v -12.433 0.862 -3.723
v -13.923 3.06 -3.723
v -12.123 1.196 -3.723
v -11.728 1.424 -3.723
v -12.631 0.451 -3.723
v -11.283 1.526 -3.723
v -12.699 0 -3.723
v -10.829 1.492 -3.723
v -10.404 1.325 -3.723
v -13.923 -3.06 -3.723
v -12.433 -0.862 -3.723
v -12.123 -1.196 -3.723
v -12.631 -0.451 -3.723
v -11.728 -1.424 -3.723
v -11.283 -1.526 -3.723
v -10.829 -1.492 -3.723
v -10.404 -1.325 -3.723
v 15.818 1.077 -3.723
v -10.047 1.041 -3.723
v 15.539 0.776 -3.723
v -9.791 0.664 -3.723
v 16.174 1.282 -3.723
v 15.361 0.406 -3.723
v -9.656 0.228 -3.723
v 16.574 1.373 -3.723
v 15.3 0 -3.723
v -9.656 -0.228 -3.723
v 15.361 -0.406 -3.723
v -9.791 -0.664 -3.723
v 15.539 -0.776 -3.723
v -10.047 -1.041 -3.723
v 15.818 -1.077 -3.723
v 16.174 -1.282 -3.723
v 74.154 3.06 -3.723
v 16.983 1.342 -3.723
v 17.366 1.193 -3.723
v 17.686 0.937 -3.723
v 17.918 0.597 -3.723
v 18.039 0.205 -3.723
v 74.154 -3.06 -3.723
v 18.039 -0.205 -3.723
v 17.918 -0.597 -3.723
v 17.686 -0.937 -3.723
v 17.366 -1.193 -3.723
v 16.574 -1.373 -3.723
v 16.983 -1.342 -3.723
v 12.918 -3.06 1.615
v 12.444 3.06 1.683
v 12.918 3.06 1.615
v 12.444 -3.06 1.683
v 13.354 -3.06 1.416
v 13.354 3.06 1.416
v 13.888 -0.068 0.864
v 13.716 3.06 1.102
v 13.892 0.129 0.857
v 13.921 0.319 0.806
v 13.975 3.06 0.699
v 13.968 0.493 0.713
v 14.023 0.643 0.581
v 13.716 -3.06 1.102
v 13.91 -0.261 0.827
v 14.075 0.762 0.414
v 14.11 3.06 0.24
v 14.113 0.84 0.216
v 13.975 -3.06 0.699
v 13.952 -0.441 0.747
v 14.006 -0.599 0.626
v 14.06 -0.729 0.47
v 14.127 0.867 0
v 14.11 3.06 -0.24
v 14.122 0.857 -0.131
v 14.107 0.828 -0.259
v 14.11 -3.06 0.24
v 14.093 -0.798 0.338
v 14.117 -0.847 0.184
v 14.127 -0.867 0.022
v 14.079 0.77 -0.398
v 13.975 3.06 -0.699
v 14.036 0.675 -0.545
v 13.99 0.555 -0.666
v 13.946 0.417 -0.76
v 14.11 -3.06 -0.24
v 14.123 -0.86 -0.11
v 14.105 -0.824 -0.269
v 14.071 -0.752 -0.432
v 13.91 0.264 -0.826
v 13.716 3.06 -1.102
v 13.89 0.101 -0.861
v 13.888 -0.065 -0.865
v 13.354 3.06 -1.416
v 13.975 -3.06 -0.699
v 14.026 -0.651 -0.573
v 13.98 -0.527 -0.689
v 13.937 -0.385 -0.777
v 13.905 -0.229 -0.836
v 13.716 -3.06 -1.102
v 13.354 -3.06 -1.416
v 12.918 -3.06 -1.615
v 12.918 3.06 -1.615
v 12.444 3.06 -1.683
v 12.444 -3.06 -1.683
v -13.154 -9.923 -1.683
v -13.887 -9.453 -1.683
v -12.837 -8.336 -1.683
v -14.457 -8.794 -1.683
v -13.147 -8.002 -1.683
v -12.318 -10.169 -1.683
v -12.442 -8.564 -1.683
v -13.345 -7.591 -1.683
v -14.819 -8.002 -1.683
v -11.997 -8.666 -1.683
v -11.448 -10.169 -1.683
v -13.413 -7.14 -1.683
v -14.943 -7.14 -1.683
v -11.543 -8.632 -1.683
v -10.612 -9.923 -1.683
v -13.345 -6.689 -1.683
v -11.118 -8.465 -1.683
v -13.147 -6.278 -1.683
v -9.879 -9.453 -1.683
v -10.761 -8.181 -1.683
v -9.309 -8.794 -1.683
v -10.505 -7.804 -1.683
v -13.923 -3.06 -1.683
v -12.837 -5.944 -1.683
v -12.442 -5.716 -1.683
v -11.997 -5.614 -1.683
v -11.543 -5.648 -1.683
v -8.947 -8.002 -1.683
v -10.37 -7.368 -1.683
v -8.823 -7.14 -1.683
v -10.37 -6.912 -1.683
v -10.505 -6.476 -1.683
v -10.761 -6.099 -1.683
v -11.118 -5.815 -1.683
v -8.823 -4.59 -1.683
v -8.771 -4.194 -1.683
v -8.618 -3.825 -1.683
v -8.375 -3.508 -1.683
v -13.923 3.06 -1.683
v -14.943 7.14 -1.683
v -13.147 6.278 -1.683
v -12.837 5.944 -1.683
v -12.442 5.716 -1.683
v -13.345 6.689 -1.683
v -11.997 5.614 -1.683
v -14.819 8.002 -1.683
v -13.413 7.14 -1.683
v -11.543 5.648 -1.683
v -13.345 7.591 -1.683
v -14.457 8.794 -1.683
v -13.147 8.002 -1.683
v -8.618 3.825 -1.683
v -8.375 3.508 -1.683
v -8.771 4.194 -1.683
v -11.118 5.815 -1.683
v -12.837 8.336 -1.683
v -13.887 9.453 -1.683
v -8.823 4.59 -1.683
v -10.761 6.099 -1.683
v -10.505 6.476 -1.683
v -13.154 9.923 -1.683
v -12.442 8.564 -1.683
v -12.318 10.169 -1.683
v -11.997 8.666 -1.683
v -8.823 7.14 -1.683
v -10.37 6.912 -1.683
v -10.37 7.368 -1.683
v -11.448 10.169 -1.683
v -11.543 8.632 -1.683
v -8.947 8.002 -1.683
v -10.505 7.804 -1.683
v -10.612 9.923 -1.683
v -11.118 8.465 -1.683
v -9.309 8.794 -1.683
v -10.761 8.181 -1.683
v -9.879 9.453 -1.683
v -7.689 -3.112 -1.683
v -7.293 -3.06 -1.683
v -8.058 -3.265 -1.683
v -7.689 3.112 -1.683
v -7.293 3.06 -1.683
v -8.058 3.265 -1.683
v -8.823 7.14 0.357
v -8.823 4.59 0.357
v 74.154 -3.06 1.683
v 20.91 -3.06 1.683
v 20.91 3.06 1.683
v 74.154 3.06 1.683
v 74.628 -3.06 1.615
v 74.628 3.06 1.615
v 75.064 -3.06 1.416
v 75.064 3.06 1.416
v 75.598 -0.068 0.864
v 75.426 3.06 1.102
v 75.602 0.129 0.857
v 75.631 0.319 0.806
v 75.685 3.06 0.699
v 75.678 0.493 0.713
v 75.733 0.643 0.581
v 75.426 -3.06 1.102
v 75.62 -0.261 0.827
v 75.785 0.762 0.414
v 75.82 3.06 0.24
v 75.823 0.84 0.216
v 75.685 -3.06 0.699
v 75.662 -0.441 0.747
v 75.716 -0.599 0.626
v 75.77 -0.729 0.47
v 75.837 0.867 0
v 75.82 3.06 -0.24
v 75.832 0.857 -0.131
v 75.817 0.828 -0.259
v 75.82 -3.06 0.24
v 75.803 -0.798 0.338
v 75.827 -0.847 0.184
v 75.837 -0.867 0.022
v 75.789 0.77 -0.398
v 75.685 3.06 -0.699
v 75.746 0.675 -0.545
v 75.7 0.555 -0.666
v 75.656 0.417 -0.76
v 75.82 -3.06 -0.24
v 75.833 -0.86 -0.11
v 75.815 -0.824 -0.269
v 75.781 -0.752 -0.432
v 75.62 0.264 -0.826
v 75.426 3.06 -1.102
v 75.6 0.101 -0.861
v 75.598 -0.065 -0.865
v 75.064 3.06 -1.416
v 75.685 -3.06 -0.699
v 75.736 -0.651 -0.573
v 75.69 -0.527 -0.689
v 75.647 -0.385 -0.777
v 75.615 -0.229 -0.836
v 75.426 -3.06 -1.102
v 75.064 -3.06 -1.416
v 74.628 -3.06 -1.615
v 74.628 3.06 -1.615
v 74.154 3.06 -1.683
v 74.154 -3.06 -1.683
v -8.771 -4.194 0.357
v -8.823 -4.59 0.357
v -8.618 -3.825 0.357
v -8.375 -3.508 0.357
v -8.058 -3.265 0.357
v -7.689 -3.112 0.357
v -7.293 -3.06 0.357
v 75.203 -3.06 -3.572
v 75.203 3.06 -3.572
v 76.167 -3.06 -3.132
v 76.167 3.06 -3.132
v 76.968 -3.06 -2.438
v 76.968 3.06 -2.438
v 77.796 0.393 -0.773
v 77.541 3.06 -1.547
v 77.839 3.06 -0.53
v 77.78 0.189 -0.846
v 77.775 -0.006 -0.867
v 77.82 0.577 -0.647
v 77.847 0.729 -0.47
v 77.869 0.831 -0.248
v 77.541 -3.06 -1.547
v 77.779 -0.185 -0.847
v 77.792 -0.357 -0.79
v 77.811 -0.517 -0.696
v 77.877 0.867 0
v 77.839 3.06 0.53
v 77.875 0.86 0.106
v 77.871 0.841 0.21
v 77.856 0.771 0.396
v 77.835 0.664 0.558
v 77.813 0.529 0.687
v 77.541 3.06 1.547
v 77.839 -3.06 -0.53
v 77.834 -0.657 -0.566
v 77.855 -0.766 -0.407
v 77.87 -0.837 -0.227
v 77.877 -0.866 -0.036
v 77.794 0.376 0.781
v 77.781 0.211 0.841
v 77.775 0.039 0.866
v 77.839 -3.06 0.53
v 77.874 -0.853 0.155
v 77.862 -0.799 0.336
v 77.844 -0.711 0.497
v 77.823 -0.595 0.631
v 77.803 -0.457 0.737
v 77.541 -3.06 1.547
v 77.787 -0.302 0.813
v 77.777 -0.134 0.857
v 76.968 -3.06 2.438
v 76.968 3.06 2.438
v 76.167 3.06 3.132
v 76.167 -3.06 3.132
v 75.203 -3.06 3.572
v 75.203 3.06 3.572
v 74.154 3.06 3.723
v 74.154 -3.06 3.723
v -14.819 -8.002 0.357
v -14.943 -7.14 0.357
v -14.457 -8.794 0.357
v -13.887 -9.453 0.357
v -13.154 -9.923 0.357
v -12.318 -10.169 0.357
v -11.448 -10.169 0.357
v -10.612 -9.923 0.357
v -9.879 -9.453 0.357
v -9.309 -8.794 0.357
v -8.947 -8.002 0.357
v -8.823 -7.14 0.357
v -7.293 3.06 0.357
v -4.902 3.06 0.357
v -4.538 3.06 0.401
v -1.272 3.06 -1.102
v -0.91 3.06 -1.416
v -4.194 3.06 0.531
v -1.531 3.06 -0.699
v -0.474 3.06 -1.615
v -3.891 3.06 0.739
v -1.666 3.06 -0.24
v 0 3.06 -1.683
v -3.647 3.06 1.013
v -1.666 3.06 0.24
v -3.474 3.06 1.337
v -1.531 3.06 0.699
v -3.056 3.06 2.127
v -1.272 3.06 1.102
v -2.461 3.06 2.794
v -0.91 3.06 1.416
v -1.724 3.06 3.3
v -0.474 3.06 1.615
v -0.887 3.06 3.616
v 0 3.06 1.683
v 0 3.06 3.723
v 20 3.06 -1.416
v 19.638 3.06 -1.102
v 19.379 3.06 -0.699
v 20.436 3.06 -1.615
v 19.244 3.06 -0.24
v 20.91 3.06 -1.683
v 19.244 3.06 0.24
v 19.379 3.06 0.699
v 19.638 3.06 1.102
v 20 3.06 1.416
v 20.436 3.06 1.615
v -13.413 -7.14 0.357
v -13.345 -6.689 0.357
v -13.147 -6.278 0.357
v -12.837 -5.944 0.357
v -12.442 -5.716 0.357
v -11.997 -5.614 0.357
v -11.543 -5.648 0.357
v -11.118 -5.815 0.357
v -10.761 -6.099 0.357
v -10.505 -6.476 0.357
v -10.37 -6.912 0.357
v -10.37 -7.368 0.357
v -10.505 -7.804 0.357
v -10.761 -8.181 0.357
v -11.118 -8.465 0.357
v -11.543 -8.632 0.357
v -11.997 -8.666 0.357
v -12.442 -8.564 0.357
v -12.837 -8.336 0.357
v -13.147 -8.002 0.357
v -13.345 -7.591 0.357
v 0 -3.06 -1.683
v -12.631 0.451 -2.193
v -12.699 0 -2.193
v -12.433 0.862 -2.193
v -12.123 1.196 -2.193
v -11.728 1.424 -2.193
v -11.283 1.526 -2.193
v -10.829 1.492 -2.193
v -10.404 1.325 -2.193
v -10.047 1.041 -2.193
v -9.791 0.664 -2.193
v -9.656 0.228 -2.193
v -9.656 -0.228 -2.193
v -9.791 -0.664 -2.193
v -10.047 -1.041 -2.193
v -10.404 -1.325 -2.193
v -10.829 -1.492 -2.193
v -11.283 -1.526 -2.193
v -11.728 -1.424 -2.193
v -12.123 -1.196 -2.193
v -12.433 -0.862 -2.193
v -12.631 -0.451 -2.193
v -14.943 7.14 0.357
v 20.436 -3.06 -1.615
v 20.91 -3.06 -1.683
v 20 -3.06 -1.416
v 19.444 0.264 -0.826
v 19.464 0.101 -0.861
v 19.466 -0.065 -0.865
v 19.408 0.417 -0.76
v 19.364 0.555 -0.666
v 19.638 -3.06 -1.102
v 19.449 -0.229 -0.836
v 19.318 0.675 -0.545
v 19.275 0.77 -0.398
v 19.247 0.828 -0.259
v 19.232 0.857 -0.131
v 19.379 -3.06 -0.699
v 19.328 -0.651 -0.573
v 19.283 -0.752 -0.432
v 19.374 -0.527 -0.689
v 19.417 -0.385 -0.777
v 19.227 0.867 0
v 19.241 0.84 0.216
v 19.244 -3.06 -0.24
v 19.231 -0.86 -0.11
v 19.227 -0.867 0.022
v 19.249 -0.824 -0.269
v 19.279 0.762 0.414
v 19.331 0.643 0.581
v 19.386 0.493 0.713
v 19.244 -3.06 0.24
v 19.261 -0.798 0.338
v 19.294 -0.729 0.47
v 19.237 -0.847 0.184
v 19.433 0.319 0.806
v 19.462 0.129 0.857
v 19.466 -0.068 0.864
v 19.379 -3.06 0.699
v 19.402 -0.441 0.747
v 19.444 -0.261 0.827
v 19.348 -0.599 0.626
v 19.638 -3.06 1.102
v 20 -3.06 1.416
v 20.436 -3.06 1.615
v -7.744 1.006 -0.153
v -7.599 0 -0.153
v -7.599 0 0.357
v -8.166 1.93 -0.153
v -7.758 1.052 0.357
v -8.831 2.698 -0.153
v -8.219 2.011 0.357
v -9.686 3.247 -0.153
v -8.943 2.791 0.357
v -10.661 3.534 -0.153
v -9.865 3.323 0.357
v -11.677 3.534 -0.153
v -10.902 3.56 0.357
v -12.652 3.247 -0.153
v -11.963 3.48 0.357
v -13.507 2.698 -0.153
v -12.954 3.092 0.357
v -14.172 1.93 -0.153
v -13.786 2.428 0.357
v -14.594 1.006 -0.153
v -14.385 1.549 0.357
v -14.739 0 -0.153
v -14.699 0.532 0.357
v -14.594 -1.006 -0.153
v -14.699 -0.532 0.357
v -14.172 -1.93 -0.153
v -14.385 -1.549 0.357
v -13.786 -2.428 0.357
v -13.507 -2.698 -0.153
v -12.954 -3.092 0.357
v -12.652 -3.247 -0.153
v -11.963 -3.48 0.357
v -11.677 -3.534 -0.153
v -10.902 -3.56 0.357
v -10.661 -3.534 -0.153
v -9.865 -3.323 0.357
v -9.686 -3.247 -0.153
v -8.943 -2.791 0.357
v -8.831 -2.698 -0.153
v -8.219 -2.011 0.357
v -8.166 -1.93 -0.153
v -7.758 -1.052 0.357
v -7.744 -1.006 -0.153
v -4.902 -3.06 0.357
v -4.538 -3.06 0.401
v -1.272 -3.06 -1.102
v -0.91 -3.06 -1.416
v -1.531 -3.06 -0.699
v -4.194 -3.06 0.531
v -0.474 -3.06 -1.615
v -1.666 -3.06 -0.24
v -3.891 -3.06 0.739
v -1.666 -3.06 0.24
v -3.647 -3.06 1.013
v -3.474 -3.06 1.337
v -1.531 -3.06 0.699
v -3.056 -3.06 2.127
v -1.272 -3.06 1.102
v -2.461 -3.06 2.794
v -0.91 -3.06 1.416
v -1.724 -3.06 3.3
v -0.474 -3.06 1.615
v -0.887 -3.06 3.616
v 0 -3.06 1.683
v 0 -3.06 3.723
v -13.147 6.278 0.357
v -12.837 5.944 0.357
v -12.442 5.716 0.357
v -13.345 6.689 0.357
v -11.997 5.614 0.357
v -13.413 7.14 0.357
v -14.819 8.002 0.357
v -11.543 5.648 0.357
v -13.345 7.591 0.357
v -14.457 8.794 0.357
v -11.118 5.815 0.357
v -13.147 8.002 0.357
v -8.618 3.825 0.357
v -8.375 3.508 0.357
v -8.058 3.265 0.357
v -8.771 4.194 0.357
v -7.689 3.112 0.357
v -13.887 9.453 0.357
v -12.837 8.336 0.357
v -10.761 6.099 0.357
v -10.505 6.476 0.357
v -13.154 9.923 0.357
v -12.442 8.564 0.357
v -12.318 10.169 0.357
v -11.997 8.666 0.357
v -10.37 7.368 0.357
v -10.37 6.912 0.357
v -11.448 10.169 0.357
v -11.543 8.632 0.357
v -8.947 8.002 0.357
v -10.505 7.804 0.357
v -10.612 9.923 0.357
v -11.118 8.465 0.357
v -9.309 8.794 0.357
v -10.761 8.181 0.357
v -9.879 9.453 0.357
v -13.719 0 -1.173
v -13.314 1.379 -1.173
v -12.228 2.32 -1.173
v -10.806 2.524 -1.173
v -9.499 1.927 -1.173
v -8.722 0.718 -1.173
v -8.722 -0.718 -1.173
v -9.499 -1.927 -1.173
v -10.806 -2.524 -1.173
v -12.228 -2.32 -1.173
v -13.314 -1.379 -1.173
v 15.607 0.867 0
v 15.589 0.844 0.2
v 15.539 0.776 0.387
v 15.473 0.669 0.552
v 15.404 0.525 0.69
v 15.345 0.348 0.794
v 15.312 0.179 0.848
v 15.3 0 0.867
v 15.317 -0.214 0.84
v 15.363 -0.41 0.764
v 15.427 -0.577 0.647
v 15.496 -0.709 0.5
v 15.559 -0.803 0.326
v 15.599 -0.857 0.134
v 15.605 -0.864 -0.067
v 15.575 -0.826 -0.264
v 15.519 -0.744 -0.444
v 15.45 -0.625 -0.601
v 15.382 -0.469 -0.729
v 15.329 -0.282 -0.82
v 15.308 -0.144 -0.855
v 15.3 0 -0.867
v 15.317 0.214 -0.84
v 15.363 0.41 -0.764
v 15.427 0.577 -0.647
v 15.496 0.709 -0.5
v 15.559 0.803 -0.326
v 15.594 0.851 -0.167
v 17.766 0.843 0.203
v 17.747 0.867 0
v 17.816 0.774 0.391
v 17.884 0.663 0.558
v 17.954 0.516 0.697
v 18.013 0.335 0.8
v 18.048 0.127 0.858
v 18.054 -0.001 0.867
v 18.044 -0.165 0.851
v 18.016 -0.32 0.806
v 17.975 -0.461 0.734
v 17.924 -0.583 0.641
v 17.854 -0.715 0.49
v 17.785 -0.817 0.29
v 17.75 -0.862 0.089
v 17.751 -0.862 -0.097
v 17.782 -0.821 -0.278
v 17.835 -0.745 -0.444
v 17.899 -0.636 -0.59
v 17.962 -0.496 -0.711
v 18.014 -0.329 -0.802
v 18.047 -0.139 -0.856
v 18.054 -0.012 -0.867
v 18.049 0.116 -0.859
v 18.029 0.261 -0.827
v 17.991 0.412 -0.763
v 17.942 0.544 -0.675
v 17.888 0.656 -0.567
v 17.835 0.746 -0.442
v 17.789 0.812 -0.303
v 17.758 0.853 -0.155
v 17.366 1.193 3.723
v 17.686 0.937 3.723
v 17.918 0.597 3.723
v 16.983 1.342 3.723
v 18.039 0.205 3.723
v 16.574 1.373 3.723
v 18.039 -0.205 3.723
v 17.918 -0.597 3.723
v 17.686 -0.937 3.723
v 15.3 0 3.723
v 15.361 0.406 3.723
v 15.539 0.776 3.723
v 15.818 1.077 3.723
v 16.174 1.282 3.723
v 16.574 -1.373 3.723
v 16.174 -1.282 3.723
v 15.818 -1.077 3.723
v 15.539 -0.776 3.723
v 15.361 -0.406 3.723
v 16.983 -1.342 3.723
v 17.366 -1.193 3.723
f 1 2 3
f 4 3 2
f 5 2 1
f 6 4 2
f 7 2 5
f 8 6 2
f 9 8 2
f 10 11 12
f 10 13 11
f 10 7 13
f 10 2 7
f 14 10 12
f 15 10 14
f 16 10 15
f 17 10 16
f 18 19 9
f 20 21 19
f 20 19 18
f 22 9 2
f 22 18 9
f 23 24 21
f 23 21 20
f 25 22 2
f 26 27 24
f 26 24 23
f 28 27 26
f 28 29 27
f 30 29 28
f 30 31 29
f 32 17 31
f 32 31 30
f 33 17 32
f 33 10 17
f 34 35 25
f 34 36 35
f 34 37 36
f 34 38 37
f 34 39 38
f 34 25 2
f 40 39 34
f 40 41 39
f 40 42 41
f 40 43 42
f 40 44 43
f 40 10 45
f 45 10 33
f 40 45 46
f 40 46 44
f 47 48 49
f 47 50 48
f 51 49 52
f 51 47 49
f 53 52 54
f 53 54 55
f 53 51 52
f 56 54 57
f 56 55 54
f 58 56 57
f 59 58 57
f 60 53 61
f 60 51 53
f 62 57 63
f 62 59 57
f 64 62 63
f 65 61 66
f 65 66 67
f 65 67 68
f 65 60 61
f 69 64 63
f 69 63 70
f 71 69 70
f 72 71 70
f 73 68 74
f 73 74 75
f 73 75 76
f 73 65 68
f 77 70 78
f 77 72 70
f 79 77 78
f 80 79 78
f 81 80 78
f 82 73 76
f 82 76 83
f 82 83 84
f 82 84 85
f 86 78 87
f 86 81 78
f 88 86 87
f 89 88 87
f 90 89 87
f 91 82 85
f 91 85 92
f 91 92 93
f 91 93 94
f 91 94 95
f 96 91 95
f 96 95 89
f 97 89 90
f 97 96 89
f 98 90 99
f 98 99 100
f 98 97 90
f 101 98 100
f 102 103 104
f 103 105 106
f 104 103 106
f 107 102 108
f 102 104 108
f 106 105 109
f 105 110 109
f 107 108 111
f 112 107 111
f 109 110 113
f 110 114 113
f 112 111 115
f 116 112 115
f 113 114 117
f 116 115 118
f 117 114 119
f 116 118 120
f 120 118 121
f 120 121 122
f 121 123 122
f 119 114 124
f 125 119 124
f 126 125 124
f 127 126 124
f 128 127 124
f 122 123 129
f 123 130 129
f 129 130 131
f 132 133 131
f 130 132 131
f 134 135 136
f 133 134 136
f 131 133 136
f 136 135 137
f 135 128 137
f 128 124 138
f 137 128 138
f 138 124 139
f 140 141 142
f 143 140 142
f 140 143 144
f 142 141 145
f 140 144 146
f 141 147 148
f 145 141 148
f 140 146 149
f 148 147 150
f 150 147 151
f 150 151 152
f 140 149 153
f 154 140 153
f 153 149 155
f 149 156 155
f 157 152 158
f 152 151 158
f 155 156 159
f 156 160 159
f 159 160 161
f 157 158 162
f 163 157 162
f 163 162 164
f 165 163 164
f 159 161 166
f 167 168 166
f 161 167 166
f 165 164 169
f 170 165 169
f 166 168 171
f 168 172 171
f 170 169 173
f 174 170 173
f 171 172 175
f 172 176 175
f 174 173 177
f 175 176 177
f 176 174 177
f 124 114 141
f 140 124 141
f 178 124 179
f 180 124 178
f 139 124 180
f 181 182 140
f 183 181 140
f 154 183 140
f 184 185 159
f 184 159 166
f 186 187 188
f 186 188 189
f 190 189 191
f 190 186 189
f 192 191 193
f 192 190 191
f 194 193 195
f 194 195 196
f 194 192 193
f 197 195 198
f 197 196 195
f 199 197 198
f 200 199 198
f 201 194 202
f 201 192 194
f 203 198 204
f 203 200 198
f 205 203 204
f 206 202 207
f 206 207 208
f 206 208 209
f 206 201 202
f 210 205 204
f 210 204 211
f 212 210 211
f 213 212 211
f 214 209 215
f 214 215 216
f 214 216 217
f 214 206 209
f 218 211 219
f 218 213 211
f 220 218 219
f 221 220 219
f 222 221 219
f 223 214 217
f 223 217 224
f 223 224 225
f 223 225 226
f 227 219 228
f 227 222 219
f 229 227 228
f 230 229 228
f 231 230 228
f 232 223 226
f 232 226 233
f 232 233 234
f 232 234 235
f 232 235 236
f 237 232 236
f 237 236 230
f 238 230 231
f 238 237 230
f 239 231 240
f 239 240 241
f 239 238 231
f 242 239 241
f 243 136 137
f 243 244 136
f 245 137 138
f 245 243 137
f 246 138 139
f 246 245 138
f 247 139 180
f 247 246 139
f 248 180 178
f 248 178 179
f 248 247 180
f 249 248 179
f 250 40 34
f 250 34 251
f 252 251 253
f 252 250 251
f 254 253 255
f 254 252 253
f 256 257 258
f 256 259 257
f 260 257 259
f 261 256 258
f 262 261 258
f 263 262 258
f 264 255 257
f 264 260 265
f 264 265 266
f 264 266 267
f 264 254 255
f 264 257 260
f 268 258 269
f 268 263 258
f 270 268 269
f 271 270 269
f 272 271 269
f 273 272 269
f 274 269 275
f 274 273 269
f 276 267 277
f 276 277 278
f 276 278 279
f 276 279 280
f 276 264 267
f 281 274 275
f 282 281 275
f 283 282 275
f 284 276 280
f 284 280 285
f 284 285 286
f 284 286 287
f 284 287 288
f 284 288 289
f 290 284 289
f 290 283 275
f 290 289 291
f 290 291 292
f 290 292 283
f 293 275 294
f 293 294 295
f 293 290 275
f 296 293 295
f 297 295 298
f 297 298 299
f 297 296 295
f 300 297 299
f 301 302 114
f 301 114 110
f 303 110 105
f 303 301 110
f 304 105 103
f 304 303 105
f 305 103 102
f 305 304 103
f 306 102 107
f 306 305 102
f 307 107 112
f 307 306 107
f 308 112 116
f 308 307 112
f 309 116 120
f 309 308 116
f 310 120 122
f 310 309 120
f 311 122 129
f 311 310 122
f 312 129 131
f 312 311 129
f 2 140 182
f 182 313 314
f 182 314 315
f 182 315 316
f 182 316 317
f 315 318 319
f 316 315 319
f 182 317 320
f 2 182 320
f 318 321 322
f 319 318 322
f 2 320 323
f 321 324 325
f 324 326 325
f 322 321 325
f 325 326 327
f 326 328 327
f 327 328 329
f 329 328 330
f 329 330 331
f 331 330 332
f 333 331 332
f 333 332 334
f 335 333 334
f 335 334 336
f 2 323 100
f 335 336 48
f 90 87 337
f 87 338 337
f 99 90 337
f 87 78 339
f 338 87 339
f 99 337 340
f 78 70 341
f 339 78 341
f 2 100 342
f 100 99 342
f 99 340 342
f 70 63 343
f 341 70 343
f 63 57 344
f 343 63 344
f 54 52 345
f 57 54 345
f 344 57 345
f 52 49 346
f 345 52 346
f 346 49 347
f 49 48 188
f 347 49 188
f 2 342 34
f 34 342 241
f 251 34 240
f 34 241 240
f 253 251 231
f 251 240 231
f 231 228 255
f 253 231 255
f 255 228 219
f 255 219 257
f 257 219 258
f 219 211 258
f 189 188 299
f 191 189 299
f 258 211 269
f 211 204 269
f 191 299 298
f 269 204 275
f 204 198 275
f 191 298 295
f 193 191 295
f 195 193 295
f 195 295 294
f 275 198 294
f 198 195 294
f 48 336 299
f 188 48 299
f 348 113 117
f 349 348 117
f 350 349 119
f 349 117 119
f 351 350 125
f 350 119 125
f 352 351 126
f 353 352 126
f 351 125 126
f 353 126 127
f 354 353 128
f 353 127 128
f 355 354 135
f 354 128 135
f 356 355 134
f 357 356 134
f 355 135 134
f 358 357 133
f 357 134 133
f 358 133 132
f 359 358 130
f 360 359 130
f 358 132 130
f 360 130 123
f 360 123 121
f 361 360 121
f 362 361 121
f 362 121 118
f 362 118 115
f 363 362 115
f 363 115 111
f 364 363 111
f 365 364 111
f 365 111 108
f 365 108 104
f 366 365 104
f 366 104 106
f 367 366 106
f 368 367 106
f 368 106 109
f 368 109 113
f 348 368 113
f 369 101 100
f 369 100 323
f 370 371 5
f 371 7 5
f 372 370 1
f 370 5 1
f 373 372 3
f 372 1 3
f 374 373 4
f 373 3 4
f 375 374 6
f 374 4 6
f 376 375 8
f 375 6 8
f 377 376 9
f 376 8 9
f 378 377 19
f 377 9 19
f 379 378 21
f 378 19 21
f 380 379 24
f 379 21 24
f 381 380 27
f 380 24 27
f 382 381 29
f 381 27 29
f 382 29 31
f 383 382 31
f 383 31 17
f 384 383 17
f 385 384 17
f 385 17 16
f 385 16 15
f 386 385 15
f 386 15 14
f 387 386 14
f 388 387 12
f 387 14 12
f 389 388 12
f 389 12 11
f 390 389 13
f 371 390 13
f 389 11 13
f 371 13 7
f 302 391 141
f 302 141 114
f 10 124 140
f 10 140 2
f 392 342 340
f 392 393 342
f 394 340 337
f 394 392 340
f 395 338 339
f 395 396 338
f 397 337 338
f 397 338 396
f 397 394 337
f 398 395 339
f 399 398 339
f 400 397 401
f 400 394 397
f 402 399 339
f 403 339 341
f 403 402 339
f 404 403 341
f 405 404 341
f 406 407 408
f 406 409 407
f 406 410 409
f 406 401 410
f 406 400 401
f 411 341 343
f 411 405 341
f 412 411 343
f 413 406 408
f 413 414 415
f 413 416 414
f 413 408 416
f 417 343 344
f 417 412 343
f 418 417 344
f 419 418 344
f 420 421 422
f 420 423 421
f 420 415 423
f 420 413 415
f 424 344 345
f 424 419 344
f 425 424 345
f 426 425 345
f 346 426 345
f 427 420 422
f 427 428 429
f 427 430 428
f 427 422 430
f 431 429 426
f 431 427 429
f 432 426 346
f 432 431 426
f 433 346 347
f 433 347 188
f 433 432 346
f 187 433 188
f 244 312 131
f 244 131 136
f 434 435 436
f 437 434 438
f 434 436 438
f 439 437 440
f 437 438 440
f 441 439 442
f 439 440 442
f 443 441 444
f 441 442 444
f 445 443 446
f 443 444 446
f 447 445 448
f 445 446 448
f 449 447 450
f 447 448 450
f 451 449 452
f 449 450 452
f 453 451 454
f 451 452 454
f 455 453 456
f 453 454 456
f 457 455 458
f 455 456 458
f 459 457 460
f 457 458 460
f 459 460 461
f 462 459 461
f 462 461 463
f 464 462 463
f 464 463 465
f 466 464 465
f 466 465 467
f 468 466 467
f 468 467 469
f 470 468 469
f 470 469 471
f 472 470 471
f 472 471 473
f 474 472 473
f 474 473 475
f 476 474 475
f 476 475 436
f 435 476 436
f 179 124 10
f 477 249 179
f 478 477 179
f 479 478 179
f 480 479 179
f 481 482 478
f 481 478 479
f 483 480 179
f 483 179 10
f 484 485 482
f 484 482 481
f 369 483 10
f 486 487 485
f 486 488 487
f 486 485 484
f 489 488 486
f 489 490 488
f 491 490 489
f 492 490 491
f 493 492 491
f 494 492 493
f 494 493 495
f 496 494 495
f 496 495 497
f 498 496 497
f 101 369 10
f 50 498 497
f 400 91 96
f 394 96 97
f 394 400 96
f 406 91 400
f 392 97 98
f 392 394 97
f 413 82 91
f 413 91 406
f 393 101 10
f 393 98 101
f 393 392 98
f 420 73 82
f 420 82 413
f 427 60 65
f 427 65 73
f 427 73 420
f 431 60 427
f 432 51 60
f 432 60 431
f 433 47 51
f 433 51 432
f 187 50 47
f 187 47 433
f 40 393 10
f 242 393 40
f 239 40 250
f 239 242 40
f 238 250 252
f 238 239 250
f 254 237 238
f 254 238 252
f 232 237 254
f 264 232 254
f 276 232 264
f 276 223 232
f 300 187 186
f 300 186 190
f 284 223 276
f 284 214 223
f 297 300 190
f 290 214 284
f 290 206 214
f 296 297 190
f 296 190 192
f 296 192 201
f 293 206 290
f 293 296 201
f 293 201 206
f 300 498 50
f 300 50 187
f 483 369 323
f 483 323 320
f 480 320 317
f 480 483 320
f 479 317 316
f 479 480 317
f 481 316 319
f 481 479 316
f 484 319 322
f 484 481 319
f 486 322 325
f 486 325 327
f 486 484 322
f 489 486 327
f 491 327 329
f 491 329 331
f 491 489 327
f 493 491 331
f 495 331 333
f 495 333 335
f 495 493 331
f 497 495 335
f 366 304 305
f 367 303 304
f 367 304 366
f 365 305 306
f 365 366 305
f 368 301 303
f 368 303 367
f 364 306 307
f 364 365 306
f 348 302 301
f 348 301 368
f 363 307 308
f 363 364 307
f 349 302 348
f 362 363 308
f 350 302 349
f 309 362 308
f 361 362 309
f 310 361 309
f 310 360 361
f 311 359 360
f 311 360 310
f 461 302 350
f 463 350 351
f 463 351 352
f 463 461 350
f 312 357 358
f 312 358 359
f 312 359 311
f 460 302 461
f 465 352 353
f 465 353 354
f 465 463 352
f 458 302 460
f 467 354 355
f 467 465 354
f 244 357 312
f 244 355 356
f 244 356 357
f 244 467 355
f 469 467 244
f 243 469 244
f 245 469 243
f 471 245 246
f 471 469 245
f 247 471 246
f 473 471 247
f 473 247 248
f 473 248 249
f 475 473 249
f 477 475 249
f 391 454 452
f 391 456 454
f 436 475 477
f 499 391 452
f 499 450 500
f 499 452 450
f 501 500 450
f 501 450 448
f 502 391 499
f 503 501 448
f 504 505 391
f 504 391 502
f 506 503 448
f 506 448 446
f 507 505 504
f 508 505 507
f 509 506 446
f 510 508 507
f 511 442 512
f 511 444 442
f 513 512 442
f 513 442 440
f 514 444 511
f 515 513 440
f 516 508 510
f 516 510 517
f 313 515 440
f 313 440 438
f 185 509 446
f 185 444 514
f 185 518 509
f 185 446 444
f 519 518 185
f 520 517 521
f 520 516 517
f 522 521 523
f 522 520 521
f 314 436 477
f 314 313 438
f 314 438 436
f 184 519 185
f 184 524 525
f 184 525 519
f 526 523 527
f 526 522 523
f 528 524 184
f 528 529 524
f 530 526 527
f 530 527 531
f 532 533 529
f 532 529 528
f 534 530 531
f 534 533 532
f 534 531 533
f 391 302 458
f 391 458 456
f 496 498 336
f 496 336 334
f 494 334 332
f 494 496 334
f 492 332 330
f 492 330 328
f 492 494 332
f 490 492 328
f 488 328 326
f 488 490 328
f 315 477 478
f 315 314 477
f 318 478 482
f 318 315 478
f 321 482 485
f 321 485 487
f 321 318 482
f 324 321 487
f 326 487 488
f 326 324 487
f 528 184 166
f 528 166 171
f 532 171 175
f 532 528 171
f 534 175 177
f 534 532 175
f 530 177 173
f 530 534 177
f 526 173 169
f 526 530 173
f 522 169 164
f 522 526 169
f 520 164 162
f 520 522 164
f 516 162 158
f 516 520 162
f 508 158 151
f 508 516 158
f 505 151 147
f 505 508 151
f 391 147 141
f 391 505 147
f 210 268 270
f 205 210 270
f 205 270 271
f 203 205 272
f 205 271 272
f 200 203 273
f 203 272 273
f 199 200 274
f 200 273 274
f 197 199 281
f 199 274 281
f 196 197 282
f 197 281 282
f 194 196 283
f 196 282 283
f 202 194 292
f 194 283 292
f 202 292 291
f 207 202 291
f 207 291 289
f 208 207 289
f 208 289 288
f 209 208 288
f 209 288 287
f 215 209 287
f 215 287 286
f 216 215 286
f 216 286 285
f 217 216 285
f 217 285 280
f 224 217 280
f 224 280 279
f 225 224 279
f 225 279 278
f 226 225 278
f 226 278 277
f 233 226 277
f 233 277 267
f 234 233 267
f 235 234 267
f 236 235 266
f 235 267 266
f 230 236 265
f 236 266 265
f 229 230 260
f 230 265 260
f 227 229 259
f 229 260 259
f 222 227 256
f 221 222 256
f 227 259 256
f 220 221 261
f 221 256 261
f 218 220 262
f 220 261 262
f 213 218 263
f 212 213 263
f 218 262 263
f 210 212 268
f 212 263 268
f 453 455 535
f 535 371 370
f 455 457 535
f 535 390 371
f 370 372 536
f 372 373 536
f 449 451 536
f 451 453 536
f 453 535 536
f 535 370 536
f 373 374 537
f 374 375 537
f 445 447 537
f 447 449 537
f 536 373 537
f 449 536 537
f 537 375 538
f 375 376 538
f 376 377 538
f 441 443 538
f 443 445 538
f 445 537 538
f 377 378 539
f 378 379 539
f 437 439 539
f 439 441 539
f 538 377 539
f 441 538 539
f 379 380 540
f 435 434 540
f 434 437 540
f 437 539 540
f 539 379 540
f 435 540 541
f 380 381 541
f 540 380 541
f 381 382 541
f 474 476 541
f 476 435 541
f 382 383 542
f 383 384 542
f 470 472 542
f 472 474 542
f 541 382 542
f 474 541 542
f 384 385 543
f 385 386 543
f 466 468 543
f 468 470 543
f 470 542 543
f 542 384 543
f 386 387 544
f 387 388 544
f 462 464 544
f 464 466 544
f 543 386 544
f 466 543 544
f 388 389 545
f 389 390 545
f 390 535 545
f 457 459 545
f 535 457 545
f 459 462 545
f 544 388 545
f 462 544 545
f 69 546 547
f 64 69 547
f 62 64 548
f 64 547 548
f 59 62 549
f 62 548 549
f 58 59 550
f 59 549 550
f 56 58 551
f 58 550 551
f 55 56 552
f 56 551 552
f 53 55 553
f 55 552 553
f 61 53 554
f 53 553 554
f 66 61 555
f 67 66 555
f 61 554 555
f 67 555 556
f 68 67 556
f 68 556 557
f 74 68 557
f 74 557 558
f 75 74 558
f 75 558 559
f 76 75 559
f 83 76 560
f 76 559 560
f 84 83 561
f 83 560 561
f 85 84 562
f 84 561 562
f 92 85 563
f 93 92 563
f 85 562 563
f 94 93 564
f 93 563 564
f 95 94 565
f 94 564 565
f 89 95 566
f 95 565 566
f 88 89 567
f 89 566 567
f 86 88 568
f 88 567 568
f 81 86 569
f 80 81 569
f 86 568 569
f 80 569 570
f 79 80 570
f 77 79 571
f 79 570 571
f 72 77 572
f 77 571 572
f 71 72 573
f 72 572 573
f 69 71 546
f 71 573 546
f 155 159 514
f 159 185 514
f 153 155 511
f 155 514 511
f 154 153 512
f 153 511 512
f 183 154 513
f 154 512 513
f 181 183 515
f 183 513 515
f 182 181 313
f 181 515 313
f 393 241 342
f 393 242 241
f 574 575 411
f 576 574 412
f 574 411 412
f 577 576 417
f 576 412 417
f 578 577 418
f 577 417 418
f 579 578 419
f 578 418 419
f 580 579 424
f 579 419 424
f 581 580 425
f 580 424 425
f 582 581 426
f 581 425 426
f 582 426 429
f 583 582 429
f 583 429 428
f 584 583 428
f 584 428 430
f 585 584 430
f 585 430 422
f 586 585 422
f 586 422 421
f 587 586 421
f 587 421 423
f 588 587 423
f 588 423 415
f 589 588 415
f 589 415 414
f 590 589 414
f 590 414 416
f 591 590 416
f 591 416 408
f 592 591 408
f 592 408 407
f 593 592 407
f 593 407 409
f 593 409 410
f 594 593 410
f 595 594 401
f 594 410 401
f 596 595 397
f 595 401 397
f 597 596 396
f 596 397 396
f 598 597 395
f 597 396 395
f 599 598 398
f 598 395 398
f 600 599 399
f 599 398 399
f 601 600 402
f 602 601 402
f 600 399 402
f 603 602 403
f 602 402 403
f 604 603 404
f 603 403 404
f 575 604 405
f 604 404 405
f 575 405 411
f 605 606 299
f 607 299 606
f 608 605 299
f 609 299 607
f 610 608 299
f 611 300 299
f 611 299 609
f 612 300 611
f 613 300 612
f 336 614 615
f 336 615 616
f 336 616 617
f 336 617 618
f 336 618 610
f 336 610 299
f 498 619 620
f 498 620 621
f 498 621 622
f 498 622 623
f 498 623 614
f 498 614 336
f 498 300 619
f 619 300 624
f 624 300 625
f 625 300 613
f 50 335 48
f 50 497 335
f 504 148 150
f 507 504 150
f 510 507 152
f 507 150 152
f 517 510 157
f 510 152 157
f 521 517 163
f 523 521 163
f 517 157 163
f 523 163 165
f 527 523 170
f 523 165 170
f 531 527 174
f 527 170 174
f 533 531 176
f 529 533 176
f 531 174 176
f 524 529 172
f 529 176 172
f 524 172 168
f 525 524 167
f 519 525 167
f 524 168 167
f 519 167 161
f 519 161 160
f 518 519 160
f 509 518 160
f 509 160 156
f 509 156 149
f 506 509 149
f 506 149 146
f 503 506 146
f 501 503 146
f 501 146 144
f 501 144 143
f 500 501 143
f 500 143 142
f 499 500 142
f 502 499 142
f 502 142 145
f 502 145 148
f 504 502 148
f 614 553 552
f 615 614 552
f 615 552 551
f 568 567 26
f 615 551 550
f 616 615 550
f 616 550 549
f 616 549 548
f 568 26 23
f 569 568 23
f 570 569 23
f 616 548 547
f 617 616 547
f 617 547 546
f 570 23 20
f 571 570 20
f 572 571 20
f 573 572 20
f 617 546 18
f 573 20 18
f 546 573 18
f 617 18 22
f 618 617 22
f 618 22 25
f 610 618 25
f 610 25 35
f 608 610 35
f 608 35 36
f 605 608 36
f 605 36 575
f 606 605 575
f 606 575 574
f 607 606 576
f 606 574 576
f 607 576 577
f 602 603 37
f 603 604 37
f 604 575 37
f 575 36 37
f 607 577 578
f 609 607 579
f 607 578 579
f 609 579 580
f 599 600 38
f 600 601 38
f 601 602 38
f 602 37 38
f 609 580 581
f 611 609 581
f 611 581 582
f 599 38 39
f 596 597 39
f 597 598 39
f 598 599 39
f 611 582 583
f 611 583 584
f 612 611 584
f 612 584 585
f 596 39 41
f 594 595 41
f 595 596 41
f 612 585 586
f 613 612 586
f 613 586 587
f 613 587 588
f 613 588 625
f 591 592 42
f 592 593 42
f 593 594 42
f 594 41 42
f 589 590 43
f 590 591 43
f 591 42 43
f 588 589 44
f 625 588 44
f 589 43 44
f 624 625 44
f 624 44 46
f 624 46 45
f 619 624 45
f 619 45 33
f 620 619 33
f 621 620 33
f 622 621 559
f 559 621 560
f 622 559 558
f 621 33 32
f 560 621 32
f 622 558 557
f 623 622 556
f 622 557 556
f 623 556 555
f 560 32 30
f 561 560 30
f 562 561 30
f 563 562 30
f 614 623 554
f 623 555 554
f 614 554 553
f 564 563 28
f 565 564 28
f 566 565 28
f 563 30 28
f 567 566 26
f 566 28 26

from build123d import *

# Parameters (mm, degrees)
F1_DEPTH       = 3
F3_DEPTH       = 6
F5_DEPTH       = 2
F6_R           = 3.5
F7_DEPTH       = 0.5
F9_D           = 3
F9_CSINK_D     = 7
F9_CSINK_ANGLE = 90
F10_D          = 3
F11_R          = 1.5
F14_R          = 0.85
F15_DEPTH      = 63.7357865376
F17_D          = 2.7
F18_SCALE      = 1.02


with BuildPart() as f1:
    # F0 (on Front) → F1 (new body, symmetric)
    with BuildSketch(Plane.XZ):
        with BuildLine():
            ThreePointArc((0, 3.65), (-3.65, 0), (0, -3.65))
            Line((0, -3.65), (72.7, -3.65))
            ThreePointArc((72.7, -3.65), (76.35, 0), (72.7, 3.65))
            Line((72.7, 3.65), (0, 3.65))
        make_face()
        with BuildLine():
            Line((12.2, -1.65), (0, -1.65))
            ThreePointArc((0, -1.65), (-1.65, 0), (0, 1.65))
            Line((0, 1.65), (12.2, 1.65))
            ThreePointArc((12.2, 1.65), (13.85, 0), (12.2, -1.65))
        make_face(mode=Mode.SUBTRACT)
        with BuildLine():
            Line((20.5, 1.65), (72.7, 1.65))
            ThreePointArc((72.7, 1.65), (74.35, 0), (72.7, -1.65))
            Line((72.7, -1.65), (20.5, -1.65))
            ThreePointArc((20.5, -1.65), (18.85, 0), (20.5, 1.65))
        make_face(mode=Mode.SUBTRACT)
    extrude(amount=F1_DEPTH, both=True)

    # F2 (on face) → F3 (join, through all)
    with BuildSketch(Plane.XZ.offset(3)):
        with BuildLine():
            Line((-13.65, -3.65), (0, -3.65))
            ThreePointArc((0, -3.65), (-2.7018512172, -2.4540782384), (-3.6331804249, 0.35))
            Line((-3.6331804249, 0.35), (-13.65, 0.35))
            Line((-13.65, 0.35), (-13.65, -3.65))
        make_face()
    extrude(amount=-F3_DEPTH)

    # F4 (on face) → F5 (join)
    with BuildSketch(Plane.XY.offset(0.35)):
        with BuildLine():
            ThreePointArc((-14.65, -7), (-11.65, -10), (-8.65, -7))
            Line((-8.65, -7), (-8.65, 7))
            ThreePointArc((-8.65, 7), (-11.65, 10), (-14.65, 7))
            Line((-14.65, 7), (-14.65, -7))
        make_face()
    extrude(amount=-F5_DEPTH)

    # F6 (on face) → F7 (cut)
    with BuildSketch(Plane.XY.offset(0.35)):
        with Locations((-10.95, 0)):
            Circle(F6_R)
    extrude(amount=-F7_DEPTH, mode=Mode.SUBTRACT)

    # F9 (through all)
    with Locations(Plane.XY.offset(-0.15)):
        with Locations((-10.95, 0)):
            CounterSinkHole(F9_D / 2, F9_CSINK_D / 2, counter_sink_angle=F9_CSINK_ANGLE)

    # F10 (through all)
    with Locations(Plane.XY.offset(0.35)):
        with Locations((-11.65, 7), (-11.65, -7)):
            Hole(F10_D / 2)

    # F11
    f11_edges = [f1.edges().sort_by_distance(p)[0] for p in [
        (-8.65, -3, -0.65),
        (-8.65, 3, -0.65),
        (-3.63318, 0, 0.35),
    ]]
    fillet(f11_edges, radius=F11_R)

    # F14 (on plane+point) → F15 (cut, up to face)
    with BuildSketch(Plane.YZ.offset(76.35)):
        Circle(F14_R)
    extrude(amount=-F15_DEPTH, mode=Mode.SUBTRACT)

    # F17 (through all)
    with Locations(Plane.XY.offset(3.65)):
        with Locations((16.35, 0)):
            Hole(F17_D / 2)


with BuildPart() as f1_1:
    # F18: moved
    add(f1.part.scale(F18_SCALE))


solid = f1_1.part
